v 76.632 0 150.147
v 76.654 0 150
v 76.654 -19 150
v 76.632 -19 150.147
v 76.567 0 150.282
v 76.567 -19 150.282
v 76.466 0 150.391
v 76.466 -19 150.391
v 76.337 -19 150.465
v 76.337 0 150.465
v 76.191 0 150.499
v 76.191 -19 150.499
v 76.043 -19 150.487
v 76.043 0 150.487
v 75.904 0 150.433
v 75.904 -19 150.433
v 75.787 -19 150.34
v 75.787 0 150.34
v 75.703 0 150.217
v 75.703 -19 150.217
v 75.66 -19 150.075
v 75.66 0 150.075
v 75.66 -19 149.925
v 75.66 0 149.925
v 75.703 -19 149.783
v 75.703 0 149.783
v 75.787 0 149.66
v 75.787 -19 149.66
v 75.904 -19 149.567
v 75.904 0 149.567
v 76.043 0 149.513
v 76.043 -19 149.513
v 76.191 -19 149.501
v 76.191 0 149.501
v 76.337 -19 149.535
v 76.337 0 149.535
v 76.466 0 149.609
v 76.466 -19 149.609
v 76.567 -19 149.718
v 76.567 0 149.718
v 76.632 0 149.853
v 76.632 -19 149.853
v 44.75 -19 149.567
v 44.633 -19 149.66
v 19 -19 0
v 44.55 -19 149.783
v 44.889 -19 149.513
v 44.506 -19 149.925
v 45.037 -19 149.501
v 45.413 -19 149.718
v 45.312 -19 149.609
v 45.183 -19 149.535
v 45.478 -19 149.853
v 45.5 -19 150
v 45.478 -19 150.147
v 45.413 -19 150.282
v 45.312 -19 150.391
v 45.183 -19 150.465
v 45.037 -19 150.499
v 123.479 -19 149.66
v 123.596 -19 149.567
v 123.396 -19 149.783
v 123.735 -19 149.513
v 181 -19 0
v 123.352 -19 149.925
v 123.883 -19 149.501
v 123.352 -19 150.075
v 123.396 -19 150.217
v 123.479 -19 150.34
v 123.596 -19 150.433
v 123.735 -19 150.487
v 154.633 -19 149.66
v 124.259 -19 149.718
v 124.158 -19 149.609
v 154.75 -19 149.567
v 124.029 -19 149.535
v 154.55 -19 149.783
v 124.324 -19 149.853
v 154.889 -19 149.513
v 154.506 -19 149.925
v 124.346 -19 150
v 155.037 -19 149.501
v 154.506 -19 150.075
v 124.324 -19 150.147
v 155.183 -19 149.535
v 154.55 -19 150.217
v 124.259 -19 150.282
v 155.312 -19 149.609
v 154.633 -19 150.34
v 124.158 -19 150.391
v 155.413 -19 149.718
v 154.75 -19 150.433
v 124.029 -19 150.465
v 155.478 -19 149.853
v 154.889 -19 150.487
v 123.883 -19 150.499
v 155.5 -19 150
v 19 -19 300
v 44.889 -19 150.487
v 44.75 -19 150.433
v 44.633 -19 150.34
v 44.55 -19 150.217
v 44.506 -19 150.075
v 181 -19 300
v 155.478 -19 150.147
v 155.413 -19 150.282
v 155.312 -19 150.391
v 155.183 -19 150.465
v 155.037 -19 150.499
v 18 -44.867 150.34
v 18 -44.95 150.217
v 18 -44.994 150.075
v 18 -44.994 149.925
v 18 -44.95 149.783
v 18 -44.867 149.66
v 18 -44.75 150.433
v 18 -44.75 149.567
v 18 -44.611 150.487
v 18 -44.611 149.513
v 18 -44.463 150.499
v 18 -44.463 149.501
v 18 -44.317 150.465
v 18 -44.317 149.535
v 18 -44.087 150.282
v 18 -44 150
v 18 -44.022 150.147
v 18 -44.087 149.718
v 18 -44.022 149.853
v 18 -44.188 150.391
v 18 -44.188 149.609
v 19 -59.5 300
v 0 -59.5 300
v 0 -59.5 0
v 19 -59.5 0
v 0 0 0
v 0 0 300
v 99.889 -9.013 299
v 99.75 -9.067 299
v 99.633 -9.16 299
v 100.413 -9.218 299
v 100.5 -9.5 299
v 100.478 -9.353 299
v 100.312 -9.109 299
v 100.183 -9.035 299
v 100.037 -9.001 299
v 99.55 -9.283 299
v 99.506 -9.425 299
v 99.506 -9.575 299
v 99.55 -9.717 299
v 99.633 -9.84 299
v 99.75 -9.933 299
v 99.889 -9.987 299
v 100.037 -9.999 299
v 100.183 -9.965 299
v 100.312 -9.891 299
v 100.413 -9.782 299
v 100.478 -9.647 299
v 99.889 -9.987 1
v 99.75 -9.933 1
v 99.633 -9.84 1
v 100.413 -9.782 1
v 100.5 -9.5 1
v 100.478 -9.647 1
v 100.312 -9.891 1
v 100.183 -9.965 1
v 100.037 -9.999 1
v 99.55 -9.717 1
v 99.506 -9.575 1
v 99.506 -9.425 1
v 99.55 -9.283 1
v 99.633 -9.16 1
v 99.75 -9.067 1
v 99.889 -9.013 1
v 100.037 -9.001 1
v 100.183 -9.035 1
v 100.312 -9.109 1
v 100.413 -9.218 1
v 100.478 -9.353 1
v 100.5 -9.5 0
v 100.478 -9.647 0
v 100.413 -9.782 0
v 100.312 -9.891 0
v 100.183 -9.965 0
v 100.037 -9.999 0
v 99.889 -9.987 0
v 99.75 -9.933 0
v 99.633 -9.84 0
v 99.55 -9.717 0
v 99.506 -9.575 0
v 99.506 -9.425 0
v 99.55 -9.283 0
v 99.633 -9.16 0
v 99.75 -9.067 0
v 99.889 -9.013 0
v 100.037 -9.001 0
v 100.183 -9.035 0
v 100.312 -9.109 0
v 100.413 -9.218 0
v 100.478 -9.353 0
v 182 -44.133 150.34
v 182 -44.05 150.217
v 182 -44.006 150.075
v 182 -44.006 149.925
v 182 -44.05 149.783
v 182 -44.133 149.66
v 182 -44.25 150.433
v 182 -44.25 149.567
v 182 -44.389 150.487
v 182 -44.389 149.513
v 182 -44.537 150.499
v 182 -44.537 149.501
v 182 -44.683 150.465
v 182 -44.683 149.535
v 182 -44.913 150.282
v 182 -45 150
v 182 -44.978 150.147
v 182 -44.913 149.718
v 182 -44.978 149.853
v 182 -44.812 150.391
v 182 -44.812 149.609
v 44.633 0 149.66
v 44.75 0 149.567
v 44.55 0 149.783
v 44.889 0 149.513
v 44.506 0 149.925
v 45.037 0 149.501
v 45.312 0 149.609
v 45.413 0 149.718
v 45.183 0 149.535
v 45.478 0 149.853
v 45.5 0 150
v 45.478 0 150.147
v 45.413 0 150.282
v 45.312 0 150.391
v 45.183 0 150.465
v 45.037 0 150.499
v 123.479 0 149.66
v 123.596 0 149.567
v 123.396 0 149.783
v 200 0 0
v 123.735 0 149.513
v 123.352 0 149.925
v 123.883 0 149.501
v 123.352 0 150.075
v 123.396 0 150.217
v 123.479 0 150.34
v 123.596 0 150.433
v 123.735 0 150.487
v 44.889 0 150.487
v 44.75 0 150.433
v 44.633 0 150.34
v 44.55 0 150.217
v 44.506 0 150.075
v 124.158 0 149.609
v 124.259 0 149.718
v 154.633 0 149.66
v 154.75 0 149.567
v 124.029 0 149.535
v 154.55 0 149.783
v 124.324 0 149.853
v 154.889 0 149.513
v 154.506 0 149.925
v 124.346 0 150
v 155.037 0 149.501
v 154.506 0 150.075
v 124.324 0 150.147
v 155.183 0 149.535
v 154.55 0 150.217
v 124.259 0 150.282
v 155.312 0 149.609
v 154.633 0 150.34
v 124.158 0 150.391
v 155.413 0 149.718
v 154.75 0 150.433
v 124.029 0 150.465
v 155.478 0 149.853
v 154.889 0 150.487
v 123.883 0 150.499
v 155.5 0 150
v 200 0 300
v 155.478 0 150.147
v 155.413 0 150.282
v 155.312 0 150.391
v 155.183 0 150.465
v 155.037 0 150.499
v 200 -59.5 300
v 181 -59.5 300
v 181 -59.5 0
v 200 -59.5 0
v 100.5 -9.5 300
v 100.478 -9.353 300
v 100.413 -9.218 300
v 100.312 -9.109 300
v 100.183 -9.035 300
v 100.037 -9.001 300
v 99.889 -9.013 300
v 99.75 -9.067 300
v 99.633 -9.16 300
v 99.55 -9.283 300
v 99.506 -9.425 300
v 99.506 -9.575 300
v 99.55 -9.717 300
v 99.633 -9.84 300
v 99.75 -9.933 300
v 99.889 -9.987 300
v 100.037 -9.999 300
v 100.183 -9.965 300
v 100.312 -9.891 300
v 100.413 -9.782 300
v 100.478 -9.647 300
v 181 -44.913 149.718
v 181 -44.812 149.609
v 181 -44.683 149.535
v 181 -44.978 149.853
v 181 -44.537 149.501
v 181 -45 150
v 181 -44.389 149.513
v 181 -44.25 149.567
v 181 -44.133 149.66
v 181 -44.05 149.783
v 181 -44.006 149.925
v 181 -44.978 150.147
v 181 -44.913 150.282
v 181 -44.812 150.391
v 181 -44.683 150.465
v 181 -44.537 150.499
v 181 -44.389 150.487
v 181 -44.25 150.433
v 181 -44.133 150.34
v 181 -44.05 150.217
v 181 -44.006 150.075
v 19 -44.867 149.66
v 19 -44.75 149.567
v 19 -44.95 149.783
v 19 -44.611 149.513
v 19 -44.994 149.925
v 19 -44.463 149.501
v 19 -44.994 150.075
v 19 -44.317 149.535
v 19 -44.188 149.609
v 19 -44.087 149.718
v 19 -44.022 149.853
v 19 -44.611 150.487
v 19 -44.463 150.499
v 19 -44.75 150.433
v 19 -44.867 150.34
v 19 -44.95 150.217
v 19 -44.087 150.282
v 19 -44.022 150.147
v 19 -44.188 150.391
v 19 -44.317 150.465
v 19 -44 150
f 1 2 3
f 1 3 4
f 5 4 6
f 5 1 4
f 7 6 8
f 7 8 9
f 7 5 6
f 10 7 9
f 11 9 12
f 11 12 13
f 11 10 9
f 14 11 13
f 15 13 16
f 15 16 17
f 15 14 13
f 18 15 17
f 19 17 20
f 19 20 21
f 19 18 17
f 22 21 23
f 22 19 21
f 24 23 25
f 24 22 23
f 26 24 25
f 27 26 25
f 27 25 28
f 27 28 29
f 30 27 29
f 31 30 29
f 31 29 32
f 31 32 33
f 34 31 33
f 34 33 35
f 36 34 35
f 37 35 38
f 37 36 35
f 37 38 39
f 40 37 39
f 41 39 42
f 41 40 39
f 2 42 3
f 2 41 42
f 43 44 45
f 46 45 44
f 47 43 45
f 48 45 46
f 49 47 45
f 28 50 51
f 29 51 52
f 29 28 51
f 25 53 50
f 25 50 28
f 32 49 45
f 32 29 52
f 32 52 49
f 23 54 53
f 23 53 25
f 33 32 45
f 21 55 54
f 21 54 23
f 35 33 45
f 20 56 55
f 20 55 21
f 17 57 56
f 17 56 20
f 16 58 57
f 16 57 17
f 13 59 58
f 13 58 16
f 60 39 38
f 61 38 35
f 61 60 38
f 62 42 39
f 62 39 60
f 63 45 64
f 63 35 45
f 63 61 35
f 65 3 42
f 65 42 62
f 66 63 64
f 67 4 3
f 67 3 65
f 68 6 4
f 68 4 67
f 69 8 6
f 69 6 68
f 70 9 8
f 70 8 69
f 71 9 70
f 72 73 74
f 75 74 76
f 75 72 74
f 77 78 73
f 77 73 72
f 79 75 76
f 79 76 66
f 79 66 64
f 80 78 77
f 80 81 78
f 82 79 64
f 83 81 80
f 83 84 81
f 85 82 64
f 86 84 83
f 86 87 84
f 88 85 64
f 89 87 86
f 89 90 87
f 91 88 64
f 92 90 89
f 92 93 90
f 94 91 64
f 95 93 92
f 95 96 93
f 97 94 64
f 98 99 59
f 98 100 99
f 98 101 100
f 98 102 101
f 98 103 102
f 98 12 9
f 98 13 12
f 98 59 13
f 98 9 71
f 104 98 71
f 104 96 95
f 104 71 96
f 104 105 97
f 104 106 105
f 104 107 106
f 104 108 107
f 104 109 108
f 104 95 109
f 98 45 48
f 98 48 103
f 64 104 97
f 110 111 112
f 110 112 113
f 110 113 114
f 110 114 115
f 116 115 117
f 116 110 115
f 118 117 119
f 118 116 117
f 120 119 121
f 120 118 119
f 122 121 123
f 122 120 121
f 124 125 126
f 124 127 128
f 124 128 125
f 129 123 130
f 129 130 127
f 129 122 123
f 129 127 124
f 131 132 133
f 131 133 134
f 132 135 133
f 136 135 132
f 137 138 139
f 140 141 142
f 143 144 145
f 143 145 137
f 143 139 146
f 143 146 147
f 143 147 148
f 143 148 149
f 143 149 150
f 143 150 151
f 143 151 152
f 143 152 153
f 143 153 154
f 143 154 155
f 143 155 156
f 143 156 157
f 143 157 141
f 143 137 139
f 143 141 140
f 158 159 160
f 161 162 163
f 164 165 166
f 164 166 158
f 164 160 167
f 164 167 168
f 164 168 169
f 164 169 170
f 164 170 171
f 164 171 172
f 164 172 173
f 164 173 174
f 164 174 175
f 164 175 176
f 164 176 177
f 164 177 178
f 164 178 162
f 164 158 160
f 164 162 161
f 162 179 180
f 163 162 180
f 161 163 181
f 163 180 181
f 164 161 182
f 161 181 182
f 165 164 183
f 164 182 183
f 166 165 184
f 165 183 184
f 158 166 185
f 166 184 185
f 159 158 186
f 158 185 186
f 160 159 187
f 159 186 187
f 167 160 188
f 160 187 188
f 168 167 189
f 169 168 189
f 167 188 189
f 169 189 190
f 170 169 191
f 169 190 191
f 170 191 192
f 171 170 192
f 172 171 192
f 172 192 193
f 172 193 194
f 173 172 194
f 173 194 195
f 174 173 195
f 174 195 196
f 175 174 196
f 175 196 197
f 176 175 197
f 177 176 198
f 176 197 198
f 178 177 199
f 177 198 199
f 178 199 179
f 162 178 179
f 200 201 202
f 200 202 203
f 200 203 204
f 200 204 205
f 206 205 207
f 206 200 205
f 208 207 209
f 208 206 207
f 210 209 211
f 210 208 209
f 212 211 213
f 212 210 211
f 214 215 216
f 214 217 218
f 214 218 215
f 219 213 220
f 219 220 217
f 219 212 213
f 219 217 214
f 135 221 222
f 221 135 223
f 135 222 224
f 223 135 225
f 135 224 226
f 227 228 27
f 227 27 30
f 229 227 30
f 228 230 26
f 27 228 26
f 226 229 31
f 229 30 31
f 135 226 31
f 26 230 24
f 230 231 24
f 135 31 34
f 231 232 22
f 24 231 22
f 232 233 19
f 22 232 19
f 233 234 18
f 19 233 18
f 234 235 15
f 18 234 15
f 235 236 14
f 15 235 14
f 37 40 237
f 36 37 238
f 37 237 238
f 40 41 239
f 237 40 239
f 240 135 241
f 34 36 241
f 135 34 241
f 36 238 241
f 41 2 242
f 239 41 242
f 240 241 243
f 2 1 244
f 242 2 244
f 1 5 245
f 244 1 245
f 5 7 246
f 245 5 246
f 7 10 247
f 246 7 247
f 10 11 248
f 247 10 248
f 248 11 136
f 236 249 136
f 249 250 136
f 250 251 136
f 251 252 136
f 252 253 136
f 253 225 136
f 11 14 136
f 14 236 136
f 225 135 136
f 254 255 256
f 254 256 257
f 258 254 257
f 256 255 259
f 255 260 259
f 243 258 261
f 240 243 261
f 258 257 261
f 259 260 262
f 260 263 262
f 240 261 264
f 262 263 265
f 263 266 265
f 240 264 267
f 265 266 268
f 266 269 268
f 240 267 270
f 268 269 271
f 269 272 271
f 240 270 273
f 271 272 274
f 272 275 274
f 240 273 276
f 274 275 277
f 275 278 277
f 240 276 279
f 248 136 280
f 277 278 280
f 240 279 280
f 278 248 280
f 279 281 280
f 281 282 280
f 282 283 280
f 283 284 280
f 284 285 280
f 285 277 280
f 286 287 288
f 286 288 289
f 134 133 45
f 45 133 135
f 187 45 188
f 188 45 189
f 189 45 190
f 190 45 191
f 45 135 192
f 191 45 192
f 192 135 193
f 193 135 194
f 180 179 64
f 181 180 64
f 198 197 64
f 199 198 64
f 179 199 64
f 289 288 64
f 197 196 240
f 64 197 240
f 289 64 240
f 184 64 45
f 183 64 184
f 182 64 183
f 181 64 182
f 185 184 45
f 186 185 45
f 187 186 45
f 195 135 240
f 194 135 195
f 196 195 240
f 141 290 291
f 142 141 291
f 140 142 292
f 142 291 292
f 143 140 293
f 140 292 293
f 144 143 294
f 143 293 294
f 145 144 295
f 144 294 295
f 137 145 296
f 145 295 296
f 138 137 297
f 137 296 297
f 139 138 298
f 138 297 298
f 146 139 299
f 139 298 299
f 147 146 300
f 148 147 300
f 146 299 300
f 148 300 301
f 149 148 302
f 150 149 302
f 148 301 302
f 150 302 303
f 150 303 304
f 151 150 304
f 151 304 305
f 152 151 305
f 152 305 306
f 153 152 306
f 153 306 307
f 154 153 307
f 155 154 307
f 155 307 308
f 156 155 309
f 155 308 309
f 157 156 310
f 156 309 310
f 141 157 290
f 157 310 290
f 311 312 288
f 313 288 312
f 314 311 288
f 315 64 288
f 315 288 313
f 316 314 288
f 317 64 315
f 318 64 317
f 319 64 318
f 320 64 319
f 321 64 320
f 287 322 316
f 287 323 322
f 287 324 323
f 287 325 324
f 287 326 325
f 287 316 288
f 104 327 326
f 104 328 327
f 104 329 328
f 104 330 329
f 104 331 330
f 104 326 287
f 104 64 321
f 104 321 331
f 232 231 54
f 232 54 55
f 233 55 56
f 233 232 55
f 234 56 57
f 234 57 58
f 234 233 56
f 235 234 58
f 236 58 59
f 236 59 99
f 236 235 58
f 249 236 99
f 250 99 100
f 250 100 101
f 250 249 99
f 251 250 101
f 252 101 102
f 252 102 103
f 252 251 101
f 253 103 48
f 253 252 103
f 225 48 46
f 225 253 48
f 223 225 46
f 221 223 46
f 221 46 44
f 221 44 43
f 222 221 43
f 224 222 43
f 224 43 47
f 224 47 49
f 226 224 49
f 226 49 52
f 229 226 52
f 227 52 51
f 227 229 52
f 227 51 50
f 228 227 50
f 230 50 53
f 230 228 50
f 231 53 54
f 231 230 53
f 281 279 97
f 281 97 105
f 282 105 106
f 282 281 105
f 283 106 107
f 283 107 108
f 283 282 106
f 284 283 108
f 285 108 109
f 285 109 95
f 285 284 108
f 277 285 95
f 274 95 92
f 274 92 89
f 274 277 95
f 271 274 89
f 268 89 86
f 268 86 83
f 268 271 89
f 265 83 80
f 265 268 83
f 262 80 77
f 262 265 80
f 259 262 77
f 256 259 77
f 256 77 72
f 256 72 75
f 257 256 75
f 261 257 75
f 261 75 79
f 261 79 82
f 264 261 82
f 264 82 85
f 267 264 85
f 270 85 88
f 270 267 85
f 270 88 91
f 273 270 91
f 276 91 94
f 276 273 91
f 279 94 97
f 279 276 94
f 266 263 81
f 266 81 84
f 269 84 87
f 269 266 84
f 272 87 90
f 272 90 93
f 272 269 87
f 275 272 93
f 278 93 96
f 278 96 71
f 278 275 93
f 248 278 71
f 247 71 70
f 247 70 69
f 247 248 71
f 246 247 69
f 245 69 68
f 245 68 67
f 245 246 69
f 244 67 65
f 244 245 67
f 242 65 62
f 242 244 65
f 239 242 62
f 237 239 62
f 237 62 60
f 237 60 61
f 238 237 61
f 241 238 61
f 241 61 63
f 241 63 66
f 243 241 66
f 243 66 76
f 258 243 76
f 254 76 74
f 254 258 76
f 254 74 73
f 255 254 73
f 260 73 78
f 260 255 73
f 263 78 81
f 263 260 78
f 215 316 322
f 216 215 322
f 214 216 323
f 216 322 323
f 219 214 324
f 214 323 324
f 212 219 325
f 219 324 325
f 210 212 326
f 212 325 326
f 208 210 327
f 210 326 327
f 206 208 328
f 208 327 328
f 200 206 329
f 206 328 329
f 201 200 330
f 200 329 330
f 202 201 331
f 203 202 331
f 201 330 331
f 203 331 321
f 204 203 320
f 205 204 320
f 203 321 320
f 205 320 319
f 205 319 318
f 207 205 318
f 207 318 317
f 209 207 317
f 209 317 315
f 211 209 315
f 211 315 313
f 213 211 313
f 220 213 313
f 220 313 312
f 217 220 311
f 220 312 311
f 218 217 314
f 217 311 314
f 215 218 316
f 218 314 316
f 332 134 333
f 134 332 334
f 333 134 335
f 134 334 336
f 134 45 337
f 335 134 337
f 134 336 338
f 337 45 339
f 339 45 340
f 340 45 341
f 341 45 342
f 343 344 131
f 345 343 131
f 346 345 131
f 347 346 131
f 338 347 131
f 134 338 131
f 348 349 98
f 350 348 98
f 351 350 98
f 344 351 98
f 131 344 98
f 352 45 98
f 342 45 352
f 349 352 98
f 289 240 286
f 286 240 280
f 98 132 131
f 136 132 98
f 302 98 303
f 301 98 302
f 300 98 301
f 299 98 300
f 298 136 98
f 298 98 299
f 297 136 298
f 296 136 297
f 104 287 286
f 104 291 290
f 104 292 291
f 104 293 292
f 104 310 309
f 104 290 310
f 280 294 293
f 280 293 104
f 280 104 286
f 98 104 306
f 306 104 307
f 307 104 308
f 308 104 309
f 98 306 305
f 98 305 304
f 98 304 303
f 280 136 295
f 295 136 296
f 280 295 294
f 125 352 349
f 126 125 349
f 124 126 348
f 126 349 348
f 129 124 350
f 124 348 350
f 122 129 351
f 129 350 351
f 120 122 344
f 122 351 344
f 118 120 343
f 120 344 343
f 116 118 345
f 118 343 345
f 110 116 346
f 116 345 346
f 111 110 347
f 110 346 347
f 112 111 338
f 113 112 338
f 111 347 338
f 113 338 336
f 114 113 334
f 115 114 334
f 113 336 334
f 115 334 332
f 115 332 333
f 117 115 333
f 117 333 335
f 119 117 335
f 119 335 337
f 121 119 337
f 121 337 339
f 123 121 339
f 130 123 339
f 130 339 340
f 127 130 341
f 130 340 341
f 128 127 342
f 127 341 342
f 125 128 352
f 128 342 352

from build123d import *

# Parameters (mm, degrees)
F0_W      = 200
F0_H      = 300
F0_R      = 0.5
F1_DEPTH  = 19
F2_W      = 19
F2_H      = 300
F3_DEPTH  = 40.5
F4_R      = 0.5
F5_DEPTH  = 1
F6_R      = 0.5
F7_DEPTH  = 1
F8_R      = 0.5
F9_DEPTH  = 1
F10_R     = 0.5
F11_DEPTH = 1


with BuildPart() as f1:
    # F0 (on Front) → F1 (new body)
    with BuildSketch(Plane.XZ):
        with Locations((100, 150)):
            Rectangle(F0_W, F0_H)
        with Locations((45, 150)):
            Circle(F0_R, mode=Mode.SUBTRACT)
        with Locations((76.153976, 150)):
            Circle(F0_R, mode=Mode.SUBTRACT)
        with Locations((123.846024, 150)):
            Circle(F0_R, mode=Mode.SUBTRACT)
        with Locations((155, 150)):
            Circle(F0_R, mode=Mode.SUBTRACT)
    extrude(amount=F1_DEPTH)

    # F2 (on face) → F3 (join)
    with BuildSketch(Plane.XZ.offset(19)):
        with Locations((9.5, 150)):
            Rectangle(F2_W, F2_H)
        with Locations((190.5, 150)):
            Rectangle(F2_W, F2_H)
    extrude(amount=F3_DEPTH)

    # F4 (on face) → F5 (cut)
    with BuildSketch(Plane.YZ.offset(19)):
        with Locations((-44.5, 150)):
            Circle(F4_R)
    extrude(amount=-F5_DEPTH, mode=Mode.SUBTRACT)

    # F6 (on face) → F7 (cut)
    with BuildSketch(Plane(origin=(181, 0, 0), x_dir=(0, -1, 0), z_dir=(-1, 0, 0))):
        with Locations((44.5, 150)):
            Circle(F6_R)
    extrude(amount=-F7_DEPTH, mode=Mode.SUBTRACT)

    # F8 (on face) → F9 (cut)
    with BuildSketch(Plane(origin=(0, 0, 0), x_dir=(1, 0, 0), z_dir=(0, 0, -1))):
        with Locations((100, 9.5)):
            Circle(F8_R)
    extrude(amount=-F9_DEPTH, mode=Mode.SUBTRACT)

    # F10 (on face) → F11 (cut)
    with BuildSketch(Plane.XY.offset(300)):
        with Locations((100, -9.5)):
            Circle(F10_R)
    extrude(amount=-F11_DEPTH, mode=Mode.SUBTRACT)


solid = f1.part
